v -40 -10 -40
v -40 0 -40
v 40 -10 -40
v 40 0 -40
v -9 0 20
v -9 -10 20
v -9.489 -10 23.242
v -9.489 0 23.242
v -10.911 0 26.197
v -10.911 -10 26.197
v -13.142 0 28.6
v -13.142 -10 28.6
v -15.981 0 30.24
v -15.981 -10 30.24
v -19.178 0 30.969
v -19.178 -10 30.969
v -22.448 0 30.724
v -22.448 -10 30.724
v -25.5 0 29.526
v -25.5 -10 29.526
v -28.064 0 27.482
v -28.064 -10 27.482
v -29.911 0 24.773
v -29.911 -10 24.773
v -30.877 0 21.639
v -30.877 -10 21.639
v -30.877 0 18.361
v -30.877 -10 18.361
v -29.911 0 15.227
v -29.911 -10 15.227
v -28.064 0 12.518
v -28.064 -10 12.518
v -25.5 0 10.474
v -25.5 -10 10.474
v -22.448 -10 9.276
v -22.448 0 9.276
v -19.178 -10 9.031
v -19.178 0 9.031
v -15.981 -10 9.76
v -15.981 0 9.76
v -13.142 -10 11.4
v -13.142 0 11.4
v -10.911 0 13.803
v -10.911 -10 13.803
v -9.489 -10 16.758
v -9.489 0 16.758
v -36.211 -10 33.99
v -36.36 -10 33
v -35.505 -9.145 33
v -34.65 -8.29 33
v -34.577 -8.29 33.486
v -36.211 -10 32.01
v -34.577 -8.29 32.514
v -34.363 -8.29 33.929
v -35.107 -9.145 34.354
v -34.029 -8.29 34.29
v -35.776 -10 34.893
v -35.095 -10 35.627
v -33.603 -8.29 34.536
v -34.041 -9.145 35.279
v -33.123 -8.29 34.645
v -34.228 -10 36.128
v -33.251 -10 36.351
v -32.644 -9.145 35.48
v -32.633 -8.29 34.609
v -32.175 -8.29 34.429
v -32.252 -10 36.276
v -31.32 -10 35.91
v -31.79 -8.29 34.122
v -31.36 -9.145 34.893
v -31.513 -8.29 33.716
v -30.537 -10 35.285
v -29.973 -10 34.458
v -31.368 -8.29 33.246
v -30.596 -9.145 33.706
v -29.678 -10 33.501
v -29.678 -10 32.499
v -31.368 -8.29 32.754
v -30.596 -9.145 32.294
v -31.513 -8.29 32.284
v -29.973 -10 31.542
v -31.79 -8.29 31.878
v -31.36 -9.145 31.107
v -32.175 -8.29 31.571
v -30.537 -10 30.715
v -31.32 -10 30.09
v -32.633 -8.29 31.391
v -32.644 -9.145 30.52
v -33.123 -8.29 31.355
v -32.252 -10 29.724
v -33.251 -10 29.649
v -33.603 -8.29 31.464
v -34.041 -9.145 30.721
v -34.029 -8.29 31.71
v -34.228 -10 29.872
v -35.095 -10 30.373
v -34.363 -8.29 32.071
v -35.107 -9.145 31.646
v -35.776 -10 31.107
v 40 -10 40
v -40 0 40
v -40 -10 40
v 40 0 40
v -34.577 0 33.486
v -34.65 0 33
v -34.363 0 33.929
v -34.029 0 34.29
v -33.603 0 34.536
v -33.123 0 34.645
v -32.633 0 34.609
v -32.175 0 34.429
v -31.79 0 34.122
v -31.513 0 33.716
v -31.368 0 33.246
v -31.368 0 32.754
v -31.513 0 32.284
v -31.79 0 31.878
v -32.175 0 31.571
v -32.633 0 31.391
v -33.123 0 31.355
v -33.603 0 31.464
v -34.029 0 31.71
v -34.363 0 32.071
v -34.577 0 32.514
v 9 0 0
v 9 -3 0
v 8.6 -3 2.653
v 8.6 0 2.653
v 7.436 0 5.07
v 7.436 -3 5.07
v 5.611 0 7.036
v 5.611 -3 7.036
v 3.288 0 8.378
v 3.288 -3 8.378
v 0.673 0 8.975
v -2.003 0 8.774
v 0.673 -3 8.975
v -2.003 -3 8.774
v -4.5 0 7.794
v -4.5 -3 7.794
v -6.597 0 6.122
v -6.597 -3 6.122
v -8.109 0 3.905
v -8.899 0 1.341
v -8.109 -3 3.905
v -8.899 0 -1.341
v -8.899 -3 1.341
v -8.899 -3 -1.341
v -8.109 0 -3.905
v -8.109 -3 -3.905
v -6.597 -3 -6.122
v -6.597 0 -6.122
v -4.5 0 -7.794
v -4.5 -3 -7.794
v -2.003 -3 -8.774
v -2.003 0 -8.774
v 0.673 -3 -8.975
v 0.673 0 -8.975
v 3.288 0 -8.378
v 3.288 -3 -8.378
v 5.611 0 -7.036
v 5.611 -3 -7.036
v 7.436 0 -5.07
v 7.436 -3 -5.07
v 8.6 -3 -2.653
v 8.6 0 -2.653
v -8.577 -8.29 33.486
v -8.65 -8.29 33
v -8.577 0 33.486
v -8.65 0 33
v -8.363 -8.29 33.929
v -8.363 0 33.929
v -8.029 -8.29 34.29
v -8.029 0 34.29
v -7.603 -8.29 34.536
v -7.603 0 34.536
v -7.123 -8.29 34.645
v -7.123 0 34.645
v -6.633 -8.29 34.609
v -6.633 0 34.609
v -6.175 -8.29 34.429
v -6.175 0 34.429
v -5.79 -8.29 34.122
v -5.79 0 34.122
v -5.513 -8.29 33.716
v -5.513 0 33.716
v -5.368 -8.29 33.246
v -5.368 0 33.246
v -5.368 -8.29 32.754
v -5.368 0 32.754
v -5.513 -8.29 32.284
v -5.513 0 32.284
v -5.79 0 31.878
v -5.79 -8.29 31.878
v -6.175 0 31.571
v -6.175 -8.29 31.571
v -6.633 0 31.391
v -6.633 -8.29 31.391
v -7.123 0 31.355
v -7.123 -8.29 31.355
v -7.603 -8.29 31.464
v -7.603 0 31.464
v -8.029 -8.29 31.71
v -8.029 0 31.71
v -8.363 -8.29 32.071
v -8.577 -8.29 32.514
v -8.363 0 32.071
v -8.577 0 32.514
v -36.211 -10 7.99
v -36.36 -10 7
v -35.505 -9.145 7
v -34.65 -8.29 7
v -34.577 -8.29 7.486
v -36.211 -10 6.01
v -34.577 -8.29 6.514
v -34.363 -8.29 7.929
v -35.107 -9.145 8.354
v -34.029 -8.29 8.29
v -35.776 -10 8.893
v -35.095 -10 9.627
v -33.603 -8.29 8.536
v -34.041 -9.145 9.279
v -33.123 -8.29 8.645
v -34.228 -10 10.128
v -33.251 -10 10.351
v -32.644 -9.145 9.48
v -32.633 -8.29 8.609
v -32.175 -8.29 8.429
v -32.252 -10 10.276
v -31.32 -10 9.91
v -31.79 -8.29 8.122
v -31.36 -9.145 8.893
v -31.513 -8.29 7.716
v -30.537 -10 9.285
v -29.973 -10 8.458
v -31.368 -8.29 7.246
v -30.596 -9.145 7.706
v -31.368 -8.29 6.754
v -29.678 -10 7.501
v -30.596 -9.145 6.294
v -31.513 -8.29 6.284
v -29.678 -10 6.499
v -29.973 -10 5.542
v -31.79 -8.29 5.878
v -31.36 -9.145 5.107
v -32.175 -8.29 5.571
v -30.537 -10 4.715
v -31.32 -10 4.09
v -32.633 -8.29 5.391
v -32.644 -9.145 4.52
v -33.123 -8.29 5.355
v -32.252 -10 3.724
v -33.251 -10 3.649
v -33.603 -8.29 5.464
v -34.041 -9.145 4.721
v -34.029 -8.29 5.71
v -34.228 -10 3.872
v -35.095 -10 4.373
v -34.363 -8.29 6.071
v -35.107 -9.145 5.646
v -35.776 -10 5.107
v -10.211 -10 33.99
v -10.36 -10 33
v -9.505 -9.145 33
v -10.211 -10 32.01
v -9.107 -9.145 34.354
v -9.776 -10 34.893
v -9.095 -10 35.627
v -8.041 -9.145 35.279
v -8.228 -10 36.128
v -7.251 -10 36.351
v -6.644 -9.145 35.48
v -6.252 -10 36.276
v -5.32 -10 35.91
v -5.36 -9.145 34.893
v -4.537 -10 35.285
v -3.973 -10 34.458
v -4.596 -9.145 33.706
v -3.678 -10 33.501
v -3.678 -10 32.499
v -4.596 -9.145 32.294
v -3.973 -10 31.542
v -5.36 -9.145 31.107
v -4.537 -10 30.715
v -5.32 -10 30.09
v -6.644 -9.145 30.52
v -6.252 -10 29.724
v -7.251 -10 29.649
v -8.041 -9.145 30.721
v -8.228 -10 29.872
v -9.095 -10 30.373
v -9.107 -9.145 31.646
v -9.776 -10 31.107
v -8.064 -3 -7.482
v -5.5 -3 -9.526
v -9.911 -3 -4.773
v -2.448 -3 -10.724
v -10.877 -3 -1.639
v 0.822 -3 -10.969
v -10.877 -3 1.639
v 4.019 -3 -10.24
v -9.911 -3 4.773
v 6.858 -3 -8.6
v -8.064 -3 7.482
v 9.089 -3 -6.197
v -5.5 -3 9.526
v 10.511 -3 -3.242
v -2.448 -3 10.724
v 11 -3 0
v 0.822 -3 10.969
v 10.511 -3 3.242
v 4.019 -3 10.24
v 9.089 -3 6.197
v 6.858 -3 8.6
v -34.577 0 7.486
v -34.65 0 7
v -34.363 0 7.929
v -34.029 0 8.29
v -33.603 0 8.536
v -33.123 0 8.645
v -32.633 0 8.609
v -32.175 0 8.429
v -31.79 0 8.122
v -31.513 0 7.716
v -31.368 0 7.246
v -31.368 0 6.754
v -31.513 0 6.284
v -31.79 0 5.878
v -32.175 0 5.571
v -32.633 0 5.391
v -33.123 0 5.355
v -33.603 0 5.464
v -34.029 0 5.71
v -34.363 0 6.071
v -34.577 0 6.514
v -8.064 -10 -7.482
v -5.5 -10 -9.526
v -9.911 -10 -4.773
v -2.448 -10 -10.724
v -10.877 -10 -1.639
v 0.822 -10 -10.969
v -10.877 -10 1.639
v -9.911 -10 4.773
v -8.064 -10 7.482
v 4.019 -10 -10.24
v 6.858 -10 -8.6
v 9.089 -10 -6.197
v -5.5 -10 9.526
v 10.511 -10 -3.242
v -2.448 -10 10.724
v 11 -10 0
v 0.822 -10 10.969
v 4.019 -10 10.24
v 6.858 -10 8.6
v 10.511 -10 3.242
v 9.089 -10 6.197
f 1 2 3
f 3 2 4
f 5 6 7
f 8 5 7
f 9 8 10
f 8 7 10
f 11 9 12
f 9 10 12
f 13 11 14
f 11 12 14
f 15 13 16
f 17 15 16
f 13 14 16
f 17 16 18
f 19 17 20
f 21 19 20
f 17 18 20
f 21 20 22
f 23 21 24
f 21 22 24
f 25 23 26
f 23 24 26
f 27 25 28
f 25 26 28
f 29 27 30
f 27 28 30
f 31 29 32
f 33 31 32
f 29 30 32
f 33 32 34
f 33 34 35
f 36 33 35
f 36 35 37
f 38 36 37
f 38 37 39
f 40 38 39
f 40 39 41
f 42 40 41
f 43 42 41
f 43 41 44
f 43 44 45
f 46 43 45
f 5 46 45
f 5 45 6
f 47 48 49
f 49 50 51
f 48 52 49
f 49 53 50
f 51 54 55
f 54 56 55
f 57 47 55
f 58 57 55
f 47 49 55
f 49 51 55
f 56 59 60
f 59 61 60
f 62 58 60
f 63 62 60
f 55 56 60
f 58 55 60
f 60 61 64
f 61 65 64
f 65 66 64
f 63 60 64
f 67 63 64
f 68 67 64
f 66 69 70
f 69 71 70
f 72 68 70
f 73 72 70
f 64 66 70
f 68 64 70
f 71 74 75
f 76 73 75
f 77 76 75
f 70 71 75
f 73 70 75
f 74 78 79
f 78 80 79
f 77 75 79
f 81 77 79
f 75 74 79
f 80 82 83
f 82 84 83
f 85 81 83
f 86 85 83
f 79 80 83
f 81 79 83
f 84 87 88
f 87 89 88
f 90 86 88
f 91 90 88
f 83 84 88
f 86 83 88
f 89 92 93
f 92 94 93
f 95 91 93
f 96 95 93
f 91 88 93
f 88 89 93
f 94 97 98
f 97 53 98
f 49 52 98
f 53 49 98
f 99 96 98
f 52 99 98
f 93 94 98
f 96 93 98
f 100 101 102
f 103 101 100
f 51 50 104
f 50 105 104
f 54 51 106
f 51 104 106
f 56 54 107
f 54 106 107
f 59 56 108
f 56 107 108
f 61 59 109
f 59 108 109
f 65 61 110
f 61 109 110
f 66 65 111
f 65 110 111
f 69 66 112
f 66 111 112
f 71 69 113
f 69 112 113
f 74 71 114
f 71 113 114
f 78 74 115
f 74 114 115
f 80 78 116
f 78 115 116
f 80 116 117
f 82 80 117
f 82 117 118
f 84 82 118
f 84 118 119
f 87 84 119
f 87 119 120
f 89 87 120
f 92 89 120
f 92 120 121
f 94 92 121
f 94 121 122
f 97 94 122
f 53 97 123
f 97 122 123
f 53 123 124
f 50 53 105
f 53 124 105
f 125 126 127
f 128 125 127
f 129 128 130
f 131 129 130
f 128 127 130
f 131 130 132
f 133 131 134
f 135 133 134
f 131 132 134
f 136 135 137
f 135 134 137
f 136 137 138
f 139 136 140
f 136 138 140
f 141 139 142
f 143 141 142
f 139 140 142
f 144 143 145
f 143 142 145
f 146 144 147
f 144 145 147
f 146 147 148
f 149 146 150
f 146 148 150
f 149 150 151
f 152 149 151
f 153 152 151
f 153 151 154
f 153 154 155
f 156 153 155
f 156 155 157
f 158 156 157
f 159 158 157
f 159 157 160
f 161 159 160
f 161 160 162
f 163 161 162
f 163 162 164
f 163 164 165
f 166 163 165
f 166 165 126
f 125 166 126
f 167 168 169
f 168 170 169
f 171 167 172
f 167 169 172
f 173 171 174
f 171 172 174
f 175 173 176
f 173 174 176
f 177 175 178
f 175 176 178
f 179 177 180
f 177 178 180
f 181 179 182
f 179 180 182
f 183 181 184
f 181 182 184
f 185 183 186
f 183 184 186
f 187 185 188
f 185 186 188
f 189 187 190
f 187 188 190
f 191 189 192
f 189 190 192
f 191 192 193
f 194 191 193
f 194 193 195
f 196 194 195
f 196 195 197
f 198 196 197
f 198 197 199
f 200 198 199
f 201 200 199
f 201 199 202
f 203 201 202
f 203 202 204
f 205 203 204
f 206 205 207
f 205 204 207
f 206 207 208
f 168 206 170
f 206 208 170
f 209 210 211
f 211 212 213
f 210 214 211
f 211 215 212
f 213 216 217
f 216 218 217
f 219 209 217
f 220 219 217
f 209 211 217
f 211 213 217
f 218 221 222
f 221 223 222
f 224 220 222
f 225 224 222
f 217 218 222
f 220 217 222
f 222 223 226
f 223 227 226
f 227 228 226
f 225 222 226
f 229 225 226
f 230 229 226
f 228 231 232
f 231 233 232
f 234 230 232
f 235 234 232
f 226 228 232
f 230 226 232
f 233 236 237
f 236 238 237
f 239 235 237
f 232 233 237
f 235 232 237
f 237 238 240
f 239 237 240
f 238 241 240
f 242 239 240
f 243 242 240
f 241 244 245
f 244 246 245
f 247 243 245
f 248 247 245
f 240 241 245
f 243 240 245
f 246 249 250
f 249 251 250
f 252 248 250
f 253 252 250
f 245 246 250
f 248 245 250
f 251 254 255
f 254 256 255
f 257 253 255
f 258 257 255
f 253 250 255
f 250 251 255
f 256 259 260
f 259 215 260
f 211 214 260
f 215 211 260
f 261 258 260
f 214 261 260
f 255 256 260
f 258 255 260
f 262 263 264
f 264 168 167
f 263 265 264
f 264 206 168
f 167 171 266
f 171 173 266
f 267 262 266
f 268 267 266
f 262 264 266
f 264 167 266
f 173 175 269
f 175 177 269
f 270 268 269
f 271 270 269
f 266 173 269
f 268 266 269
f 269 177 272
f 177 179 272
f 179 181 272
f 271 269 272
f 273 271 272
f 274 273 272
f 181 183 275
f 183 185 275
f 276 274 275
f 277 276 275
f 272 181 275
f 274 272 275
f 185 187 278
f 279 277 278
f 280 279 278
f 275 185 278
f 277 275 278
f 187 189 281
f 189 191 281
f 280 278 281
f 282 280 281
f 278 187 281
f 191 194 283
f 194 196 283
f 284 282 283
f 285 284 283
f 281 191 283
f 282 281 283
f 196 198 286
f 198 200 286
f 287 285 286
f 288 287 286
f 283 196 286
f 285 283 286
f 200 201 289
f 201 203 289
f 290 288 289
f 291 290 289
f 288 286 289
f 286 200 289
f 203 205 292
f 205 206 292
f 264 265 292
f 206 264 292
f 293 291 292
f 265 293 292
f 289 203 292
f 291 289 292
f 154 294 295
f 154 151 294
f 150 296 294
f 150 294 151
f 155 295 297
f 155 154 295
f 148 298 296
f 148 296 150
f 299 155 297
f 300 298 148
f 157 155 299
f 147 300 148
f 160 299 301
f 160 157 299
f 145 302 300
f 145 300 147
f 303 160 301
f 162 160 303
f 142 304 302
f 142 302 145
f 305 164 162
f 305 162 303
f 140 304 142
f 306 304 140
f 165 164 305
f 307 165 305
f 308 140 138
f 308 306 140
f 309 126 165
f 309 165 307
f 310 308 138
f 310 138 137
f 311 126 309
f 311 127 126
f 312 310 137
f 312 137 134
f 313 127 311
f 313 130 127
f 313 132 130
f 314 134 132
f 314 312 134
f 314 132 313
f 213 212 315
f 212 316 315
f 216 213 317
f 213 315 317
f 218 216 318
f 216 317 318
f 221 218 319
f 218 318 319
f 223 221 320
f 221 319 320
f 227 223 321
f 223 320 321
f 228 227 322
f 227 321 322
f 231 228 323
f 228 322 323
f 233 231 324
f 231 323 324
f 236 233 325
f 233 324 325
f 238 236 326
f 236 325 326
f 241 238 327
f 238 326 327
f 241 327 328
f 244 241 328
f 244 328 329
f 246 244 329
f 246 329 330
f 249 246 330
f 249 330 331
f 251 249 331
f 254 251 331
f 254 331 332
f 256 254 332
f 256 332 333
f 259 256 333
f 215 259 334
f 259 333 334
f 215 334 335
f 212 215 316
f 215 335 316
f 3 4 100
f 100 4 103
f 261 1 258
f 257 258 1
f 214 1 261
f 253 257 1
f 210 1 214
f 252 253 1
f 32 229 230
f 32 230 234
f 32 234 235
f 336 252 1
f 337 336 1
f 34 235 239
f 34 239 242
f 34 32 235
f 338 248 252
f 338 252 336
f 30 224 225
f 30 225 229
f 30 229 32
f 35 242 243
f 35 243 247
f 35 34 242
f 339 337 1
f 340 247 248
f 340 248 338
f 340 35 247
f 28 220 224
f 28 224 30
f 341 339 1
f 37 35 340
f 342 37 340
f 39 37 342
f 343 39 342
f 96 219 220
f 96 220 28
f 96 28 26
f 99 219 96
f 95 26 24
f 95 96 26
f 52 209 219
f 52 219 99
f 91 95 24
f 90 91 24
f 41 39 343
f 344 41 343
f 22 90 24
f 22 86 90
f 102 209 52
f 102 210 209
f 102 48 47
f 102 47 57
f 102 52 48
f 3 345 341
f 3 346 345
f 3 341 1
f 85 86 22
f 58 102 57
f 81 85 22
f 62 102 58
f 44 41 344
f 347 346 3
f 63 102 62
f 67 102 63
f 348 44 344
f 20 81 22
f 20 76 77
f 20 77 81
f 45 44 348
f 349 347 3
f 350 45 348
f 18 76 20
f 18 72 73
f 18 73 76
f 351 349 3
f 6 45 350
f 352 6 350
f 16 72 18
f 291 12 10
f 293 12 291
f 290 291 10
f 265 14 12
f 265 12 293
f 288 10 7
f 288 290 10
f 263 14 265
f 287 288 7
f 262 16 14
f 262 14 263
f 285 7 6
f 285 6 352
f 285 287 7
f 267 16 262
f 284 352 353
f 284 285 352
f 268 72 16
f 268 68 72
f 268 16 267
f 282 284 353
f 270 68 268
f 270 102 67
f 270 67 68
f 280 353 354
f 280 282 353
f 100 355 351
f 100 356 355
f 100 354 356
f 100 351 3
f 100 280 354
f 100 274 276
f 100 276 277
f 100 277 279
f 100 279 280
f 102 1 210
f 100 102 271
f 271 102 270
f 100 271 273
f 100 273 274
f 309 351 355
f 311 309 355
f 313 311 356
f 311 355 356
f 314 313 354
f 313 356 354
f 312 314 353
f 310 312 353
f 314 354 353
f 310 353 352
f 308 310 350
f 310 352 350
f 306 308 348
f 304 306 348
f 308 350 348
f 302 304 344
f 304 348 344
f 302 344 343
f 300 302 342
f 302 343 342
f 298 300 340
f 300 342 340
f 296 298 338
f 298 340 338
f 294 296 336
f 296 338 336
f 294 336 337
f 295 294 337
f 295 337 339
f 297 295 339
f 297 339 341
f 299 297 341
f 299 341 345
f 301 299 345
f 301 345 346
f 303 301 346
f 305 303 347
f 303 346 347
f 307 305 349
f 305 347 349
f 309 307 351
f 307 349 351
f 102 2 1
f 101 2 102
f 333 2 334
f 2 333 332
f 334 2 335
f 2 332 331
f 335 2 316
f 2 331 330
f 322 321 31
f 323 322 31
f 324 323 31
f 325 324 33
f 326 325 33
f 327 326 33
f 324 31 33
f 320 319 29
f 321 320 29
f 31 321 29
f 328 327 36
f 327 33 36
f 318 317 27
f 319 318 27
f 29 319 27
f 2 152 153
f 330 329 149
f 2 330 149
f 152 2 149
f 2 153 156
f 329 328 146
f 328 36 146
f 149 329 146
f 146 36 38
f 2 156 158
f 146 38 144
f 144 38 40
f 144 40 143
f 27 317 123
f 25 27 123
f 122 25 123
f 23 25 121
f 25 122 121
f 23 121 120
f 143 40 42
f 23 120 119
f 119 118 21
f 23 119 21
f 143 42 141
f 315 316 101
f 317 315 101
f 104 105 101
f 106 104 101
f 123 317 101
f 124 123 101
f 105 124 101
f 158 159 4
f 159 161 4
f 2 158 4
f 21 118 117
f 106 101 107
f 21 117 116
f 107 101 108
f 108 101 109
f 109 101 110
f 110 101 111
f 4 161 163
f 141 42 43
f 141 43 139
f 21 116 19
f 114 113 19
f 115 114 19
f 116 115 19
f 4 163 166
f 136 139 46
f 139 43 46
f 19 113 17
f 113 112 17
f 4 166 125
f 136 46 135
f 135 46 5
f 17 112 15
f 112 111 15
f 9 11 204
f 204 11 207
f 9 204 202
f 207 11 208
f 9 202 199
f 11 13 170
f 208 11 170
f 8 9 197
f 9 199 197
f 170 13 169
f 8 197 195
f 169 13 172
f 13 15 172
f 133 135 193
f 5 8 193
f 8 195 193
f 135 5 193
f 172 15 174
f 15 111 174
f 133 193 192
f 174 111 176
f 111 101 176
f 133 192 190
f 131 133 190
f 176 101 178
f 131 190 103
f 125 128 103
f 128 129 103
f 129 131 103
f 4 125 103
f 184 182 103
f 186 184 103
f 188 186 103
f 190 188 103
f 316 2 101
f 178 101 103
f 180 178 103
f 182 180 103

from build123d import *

# Parameters (mm, degrees)
F0_W           = 80
F0_H           = 80
F1_DEPTH       = 10
F3_D           = 3.3
F3_CSINK_D     = 6.72
F3_CSINK_ANGLE = 90
F2_R           = 11
F4_DEPTH       = 10.001
F5_R           = 9
F6_DEPTH       = 10.001
F7_R           = 11
F8_DEPTH       = 7


with BuildPart() as f1:
    # F0 (on Front) → F1 (new body)
    with BuildSketch(Plane.XZ):
        Rectangle(F0_W, F0_H)
    extrude(amount=F1_DEPTH)

    # F3 (through all)
    with Locations(Plane.XZ.offset(10)):
        with Locations((-33, 33), (-7, 33), (-33, 7)):
            CounterSinkHole(F3_D / 2, F3_CSINK_D / 2, counter_sink_angle=F3_CSINK_ANGLE)

    # F2 (on face) → F4 (cut, through all)
    with BuildSketch(Plane.XZ.offset(10)):
        with Locations((-20, 20)):
            Circle(F2_R)
    extrude(amount=-F4_DEPTH, mode=Mode.SUBTRACT)

    # F5 (on face) → F6 (cut, through all)
    with BuildSketch(Plane.XZ.offset(10)):
        Circle(F5_R)
    extrude(amount=-F6_DEPTH, mode=Mode.SUBTRACT)

    # F7 (on face) → F8 (cut)
    with BuildSketch(Plane.XZ.offset(10)):
        Circle(F7_R)
    extrude(amount=-F8_DEPTH, mode=Mode.SUBTRACT)


solid = f1.part
